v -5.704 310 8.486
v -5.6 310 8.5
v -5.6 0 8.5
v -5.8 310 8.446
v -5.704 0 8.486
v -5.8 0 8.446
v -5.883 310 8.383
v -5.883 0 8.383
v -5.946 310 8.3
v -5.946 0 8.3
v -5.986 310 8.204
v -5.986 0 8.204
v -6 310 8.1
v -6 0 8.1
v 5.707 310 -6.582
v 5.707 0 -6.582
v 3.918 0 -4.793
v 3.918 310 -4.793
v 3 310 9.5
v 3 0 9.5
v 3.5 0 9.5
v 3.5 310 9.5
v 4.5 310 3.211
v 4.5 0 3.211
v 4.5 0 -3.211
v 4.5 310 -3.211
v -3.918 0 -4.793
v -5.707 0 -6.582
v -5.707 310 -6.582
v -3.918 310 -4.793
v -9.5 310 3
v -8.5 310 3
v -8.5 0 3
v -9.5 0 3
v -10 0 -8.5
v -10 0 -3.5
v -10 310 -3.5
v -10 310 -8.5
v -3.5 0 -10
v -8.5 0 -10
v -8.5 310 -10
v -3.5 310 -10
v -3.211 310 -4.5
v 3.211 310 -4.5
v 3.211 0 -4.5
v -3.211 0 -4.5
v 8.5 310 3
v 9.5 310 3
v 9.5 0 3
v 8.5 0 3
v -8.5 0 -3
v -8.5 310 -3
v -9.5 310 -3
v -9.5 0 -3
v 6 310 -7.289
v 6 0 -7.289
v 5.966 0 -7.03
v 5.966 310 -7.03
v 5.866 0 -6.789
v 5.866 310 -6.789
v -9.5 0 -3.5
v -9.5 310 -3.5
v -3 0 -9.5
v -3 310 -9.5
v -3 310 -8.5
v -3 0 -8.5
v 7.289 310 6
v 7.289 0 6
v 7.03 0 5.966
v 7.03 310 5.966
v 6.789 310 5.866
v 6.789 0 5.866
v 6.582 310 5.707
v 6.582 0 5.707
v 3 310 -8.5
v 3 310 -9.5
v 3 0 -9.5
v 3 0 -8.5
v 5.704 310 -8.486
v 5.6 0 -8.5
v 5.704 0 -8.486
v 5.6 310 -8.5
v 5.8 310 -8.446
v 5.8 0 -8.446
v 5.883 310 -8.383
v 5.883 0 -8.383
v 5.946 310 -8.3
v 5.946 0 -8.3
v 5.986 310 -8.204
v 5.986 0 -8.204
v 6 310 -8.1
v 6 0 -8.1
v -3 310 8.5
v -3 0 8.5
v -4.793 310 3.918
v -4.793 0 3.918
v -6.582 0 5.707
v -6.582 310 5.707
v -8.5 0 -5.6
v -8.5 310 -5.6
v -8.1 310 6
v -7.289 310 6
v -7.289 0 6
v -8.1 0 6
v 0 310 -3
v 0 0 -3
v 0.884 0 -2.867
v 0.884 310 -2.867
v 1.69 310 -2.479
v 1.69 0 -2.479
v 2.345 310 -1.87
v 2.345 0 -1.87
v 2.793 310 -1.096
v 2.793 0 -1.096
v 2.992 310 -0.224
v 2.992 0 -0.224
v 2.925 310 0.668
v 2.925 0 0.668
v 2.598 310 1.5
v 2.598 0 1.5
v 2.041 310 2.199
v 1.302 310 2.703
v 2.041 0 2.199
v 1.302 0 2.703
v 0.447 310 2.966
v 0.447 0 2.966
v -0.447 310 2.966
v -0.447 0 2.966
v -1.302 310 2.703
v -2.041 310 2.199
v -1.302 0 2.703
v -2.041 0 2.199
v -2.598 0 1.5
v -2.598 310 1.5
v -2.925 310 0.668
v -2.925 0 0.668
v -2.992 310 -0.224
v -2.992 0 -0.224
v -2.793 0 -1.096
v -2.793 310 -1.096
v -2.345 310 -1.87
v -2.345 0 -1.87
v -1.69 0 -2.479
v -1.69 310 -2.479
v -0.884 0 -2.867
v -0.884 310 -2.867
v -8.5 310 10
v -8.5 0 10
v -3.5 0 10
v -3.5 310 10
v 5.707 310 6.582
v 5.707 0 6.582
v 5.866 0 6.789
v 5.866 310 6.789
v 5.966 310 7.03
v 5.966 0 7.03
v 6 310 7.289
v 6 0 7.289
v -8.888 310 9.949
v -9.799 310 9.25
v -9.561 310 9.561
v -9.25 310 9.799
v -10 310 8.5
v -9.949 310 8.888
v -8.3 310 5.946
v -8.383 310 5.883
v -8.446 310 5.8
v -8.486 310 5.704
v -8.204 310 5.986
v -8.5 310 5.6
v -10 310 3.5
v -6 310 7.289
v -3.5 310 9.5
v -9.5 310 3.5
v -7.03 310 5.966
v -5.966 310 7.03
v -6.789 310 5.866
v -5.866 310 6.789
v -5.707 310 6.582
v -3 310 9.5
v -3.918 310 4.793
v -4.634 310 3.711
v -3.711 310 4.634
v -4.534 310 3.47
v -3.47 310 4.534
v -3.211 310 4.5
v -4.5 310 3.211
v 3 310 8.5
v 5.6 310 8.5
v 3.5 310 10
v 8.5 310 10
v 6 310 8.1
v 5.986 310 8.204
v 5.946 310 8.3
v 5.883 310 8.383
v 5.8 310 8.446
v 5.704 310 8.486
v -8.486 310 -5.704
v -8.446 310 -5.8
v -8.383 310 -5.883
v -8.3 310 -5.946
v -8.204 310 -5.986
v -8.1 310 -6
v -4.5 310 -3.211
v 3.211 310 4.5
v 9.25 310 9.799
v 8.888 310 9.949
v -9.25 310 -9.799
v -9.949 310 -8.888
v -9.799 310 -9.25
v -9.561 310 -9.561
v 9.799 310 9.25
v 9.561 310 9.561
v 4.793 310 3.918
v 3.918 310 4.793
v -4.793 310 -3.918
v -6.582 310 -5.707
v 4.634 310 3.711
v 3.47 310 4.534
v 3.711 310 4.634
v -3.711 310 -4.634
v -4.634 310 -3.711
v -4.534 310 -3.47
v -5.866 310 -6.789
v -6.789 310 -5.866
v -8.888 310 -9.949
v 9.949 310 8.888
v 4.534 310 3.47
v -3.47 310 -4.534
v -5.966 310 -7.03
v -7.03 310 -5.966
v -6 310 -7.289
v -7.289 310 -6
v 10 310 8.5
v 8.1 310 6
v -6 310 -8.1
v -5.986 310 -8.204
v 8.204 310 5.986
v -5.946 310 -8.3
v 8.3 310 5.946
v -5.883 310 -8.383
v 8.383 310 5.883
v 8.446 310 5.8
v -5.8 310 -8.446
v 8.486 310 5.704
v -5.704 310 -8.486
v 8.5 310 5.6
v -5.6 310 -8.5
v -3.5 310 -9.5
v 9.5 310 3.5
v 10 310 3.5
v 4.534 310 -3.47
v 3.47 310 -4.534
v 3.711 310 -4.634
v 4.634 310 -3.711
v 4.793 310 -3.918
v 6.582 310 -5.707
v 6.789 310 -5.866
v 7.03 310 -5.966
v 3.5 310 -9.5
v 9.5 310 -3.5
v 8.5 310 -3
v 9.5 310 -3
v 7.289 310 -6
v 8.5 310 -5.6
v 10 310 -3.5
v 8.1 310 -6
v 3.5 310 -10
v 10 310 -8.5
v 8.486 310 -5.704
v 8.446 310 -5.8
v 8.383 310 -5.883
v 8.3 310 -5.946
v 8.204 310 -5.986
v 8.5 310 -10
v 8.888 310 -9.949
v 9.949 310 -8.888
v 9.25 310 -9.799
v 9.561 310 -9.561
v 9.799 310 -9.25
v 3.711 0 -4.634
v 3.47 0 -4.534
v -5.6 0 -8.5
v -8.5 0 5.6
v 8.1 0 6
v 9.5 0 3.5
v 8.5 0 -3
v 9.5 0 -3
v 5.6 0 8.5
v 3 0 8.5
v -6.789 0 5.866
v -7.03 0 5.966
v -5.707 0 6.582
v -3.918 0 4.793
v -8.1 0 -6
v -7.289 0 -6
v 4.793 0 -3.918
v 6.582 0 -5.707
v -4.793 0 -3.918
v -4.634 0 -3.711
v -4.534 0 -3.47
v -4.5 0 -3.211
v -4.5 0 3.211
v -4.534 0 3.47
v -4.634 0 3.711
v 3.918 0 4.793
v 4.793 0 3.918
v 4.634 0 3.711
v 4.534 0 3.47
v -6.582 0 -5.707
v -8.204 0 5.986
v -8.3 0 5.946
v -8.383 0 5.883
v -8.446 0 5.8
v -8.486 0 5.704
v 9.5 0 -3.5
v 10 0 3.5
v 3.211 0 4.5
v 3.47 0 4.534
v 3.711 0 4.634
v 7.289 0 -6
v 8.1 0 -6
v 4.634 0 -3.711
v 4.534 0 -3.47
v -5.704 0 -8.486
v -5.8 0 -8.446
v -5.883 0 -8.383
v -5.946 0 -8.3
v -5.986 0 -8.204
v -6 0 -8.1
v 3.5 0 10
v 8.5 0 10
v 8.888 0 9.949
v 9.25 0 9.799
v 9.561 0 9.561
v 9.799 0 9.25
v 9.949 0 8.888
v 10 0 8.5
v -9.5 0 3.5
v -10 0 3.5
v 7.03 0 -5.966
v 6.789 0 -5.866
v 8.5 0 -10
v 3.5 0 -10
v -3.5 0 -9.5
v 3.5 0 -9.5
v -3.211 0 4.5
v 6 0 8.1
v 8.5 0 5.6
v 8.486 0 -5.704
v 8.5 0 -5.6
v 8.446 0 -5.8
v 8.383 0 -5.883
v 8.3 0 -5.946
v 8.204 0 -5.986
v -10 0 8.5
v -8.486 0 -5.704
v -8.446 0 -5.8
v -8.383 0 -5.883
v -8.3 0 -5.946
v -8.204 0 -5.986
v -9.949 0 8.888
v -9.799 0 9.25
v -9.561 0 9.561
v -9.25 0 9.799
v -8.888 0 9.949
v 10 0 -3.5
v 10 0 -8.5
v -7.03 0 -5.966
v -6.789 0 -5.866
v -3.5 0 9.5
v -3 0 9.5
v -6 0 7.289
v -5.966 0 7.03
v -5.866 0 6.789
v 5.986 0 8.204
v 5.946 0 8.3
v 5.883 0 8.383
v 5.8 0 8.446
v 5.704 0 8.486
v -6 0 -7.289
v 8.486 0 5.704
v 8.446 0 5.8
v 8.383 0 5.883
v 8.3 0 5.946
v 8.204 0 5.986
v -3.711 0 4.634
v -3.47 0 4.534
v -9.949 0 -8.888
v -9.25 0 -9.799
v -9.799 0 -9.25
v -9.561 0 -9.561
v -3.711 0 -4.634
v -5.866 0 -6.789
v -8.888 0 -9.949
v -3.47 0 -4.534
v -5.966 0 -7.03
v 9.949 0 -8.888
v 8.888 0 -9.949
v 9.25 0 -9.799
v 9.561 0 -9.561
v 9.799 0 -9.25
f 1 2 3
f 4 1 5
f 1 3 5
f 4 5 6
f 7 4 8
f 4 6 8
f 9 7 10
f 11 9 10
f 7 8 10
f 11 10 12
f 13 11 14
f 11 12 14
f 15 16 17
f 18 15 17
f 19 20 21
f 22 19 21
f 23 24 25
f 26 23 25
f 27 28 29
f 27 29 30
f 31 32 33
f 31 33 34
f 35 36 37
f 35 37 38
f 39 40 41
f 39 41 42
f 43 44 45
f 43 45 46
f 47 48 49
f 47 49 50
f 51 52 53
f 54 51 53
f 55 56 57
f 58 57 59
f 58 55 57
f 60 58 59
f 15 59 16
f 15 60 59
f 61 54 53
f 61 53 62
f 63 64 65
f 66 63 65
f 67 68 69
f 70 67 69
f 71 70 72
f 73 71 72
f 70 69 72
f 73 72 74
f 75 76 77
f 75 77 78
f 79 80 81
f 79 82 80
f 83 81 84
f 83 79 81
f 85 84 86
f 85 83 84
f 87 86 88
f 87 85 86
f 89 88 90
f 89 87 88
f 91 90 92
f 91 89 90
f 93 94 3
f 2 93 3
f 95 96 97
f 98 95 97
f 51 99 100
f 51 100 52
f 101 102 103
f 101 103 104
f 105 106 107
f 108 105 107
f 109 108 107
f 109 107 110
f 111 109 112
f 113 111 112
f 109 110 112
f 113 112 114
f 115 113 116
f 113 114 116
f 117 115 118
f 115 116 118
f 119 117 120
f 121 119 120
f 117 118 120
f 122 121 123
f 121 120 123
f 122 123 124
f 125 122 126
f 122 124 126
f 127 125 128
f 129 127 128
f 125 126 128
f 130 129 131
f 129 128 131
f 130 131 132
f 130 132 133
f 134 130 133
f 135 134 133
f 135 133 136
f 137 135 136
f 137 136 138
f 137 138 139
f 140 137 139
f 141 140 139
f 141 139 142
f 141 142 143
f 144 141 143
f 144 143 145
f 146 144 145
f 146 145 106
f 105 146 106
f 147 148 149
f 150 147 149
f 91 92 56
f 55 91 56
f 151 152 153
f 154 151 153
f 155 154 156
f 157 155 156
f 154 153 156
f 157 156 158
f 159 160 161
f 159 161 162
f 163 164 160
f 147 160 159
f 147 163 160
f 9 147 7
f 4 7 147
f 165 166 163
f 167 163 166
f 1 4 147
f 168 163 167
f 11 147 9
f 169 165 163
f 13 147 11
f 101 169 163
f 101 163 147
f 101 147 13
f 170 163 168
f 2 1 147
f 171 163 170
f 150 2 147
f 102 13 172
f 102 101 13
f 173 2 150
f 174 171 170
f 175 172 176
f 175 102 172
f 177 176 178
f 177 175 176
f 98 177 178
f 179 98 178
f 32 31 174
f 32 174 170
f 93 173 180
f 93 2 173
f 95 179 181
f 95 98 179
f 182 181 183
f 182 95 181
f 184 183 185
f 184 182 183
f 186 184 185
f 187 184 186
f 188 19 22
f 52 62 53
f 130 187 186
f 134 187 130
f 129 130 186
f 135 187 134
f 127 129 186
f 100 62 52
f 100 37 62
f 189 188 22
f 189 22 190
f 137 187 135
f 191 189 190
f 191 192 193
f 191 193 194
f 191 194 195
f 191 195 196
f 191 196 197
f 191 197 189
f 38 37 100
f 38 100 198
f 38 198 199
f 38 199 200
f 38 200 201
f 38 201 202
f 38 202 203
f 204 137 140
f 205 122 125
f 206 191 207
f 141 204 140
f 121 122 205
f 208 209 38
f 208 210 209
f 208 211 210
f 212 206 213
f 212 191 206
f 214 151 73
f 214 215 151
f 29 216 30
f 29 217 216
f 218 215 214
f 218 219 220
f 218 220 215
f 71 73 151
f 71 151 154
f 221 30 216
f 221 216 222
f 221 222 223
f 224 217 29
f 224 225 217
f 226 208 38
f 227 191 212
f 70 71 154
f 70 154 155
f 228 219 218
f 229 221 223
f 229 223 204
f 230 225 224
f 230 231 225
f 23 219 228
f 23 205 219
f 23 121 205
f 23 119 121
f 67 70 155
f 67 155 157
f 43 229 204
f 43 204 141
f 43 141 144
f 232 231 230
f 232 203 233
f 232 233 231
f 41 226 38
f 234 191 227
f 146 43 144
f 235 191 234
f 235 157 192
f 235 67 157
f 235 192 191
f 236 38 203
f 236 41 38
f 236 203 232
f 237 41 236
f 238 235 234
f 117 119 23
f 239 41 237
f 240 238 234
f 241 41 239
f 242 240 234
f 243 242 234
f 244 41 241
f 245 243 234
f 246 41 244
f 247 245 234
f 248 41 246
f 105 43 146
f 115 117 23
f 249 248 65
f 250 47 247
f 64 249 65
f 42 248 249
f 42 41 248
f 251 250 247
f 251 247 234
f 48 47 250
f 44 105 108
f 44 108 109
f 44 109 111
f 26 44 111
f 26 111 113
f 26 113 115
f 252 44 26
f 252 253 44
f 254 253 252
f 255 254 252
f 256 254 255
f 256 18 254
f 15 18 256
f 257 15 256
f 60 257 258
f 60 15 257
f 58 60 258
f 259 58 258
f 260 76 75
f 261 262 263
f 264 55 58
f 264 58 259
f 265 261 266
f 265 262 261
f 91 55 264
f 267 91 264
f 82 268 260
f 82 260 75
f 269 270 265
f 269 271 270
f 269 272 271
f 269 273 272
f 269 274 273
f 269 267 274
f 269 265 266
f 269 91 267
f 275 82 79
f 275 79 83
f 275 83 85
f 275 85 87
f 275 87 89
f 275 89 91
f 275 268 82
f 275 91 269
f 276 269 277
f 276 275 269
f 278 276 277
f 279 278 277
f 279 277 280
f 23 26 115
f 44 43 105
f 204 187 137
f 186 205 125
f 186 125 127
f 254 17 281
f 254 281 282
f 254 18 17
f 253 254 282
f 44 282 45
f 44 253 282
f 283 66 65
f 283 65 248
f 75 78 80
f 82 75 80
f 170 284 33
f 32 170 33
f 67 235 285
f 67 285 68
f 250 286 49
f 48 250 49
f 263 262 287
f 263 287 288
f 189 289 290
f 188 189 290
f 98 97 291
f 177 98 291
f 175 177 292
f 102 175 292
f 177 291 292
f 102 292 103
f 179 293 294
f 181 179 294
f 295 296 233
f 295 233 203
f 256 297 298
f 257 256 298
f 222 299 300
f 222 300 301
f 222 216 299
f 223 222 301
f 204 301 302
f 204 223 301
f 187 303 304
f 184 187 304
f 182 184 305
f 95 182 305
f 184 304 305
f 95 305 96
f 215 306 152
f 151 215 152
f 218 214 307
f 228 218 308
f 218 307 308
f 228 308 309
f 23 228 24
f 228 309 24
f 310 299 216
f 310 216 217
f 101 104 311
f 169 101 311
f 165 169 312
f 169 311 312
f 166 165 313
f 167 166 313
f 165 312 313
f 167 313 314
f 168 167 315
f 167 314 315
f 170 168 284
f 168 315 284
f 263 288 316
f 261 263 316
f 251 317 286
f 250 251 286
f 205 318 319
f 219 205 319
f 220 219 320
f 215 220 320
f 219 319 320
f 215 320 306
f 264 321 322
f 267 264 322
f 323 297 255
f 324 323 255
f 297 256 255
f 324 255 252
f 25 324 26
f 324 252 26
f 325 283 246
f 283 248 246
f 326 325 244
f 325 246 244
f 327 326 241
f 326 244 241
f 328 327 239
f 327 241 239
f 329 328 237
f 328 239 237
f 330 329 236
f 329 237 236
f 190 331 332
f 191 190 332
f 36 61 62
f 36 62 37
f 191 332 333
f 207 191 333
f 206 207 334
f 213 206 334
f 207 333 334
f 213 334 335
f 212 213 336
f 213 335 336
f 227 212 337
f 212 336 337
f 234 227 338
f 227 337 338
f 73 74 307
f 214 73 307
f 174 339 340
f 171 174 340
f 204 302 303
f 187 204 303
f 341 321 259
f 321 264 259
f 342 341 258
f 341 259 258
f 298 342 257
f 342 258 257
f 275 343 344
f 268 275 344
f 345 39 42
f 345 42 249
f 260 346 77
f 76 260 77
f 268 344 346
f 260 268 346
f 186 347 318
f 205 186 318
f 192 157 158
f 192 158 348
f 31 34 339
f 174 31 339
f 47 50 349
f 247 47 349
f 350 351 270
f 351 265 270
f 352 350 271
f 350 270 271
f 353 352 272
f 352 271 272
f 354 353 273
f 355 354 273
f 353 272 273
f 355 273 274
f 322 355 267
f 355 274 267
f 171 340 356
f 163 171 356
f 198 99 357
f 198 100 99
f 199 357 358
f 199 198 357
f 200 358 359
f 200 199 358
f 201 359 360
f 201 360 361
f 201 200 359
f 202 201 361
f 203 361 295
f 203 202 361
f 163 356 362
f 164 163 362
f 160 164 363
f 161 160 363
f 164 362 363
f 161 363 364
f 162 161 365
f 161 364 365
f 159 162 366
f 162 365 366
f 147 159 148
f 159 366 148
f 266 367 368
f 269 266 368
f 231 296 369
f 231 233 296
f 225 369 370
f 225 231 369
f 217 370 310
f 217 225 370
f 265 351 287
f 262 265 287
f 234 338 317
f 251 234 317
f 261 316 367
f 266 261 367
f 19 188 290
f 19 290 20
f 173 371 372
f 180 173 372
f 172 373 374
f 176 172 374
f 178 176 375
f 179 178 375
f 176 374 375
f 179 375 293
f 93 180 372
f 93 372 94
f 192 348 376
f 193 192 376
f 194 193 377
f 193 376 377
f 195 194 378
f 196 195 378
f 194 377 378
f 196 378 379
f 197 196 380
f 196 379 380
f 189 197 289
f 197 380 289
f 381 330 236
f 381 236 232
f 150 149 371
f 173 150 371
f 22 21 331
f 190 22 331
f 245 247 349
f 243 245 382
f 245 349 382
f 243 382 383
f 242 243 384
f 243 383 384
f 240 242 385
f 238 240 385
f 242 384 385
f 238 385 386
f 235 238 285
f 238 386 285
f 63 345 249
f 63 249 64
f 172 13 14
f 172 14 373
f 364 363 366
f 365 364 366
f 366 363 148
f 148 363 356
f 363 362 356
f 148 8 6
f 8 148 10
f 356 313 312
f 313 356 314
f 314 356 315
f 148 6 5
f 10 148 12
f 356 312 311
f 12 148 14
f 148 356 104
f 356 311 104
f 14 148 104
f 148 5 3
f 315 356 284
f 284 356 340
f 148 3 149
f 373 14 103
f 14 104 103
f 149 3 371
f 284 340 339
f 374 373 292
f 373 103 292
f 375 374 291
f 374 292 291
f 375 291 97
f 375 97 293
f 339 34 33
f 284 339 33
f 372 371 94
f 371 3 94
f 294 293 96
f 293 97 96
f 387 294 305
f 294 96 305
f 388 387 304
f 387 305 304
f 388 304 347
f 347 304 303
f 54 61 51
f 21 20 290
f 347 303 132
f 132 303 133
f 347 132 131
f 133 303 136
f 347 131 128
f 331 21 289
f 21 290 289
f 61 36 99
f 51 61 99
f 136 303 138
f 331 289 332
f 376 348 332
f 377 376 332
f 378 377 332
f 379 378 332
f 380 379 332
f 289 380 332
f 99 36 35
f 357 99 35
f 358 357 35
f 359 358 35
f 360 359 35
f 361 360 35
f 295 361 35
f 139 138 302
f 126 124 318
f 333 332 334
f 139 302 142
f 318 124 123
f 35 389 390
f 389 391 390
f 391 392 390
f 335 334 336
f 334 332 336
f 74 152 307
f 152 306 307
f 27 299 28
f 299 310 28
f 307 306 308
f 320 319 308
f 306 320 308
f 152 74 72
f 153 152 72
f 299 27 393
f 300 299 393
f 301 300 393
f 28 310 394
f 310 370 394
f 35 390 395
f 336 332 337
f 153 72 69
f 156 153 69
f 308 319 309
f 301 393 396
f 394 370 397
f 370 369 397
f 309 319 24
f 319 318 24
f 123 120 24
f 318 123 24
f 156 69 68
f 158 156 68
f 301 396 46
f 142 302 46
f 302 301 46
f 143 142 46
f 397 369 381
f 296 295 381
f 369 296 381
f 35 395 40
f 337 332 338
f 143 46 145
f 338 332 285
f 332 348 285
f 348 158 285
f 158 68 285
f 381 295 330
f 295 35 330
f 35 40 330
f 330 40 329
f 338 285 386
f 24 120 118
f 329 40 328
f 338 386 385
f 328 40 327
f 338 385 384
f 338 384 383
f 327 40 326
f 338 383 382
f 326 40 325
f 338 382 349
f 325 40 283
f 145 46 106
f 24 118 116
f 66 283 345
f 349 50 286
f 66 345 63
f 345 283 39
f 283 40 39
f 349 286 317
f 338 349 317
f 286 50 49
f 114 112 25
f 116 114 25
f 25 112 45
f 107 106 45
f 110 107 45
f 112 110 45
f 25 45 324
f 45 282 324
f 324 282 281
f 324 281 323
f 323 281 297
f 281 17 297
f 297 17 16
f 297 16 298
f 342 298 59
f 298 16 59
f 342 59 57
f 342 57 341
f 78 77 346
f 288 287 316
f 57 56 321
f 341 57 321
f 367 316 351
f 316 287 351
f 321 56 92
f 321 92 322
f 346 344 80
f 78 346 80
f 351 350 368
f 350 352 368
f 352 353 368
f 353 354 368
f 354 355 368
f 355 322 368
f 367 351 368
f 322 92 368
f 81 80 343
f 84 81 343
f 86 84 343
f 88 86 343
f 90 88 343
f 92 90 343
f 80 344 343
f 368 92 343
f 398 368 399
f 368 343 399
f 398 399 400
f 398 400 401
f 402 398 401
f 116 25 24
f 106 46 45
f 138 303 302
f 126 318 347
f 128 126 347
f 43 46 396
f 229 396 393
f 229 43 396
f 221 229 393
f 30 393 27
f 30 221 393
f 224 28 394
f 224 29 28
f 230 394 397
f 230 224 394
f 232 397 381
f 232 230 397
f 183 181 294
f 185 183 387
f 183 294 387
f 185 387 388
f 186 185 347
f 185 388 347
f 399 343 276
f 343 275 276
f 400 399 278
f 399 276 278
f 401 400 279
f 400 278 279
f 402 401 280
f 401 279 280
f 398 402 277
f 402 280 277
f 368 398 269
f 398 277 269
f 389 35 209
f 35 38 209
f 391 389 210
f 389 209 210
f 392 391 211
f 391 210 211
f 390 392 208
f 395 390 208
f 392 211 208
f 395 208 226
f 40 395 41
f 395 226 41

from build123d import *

# Parameters (mm, degrees)
BOSS_EXTRU_1_CORPS_DEPTH    = 310
CONG_1_R                    = 1.5
CONG_2_R                    = 0.4
CONG_4_R                    = 1
CONG_1_OF_SYM_TRIE_BRAS_R   = 1.5
CONG_2_OF_SYM_TRIE_BRAS_R   = 0.4
CONG_4_OF_SYM_TRIE_BRAS_R   = 1
SYM_TRIE_BRAS_DOUBLE_DEPTH  = 310
APR_S_TARODAGE_M6_R         = 3
ENL_V_MAT_FILETAGE_M6_DEPTH = 311.322412984


# Read off the part's stored shape, not the designer's step: Symétrie Bras double
with BuildPart() as part:
    # Esquisse4 → Boss.-Extru.1 Corps (new body)
    with BuildSketch(Plane(origin=(0, 0, 0), x_dir=(1, 0, 0), z_dir=(0, 1, 0))):
        Polygon((0, 0), (-4.5, 0), (-4.5, 3.625), (-6.875, 6), (-8.5, 6), (-8.5, 3), (-9.5, 3), (-9.5, 3.5), (-10, 3.5), (-10, 10), (-3.5, 10), (-3.5, 9.5), (-3, 9.5), (-3, 8.5), (-6, 8.5), (-6, 6.875), (-3.625, 4.5), (0, 4.5), align=None)
    boss_extru_1_corps = extrude(amount=BOSS_EXTRU_1_CORPS_DEPTH)

    # Congé1
    cong_1_edges = [part.edges().sort_by_distance(p)[0] for p in [
        (-10, 155, -10),
    ]]
    fillet(cong_1_edges, radius=CONG_1_R)

    # Congé2
    cong_2_edges = [part.edges().sort_by_distance(p)[0] for p in [
        (-8.5, 155, -6),
        (-6, 155, -8.5),
    ]]
    fillet(cong_2_edges, radius=CONG_2_R)

    # Congé4
    cong_4_edges = [part.edges().sort_by_distance(p)[0] for p in [
        (-4.5, 155, -3.625),
        (-6.875, 155, -6),
        (-6, 155, -6.875),
        (-3.625, 155, -4.5),
    ]]
    fillet(cong_4_edges, radius=CONG_4_R)

    # Symétrie Bras: Boss.-Extru.1 Corps across plane
    add(boss_extru_1_corps.mirror(Plane(origin=(0, 310, -4.5), x_dir=(0, 0, 1), z_dir=(-1, 0, 0))))

    # Congé1 of Symétrie Bras
    cong_1_of_sym_trie_bras_edges = [part.edges().sort_by_distance(p)[0] for p in [
        (10, 155, -10),
    ]]
    fillet(cong_1_of_sym_trie_bras_edges, radius=CONG_1_OF_SYM_TRIE_BRAS_R)

    # Congé2 of Symétrie Bras
    cong_2_of_sym_trie_bras_edges = [part.edges().sort_by_distance(p)[0] for p in [
        (8.5, 155, -6),
        (6, 155, -8.5),
    ]]
    fillet(cong_2_of_sym_trie_bras_edges, radius=CONG_2_OF_SYM_TRIE_BRAS_R)

    # Congé4 of Symétrie Bras
    cong_4_of_sym_trie_bras_edges = [part.edges().sort_by_distance(p)[0] for p in [
        (4.5, 155, -3.625),
        (6.875, 155, -6),
        (6, 155, -6.875),
        (3.625, 155, -4.5),
    ]]
    fillet(cong_4_of_sym_trie_bras_edges, radius=CONG_4_OF_SYM_TRIE_BRAS_R)

    # Symétrie Bras double outline → Symétrie Bras double (add)
    with BuildSketch(Plane(origin=(0, 0, 0), x_dir=(1, 0, 0), z_dir=(0, 1, 0))):
        with BuildLine():
            ThreePointArc((7.289213562, -6), (6.90653013, -5.923879533), (6.582106781, -5.707106781))
            Line((6.582106781, -5.707106781), (4.792893219, -3.917893219))
            ThreePointArc((4.792893219, -3.917893219), (4.576120467, -3.59346987), (4.5, -3.210786438))
            Line((4.5, -3.210786438), (4.5, 0))
            Line((4.5, 0), (-4.5, 0))
            Line((-4.5, 0), (-4.5, -3.210786438))
            ThreePointArc((-4.5, -3.210786438), (-4.576120467, -3.59346987), (-4.792893219, -3.917893219))
            Line((-4.792893219, -3.917893219), (-6.582106781, -5.707106781))
            ThreePointArc((-6.582106781, -5.707106781), (-6.90653013, -5.923879533), (-7.289213562, -6))
            Line((-7.289213562, -6), (-8.1, -6))
            ThreePointArc((-8.1, -6), (-8.382842712, -5.882842712), (-8.5, -5.6))
            Line((-8.5, -5.6), (-8.5, -3))
            Line((-8.5, -3), (-9.5, -3))
            Line((-9.5, -3), (-9.5, -3.5))
            Line((-9.5, -3.5), (-10, -3.5))
            Line((-10, -3.5), (-10, -8.5))
            ThreePointArc((-10, -8.5), (-9.560660172, -9.560660172), (-8.5, -10))
            Line((-8.5, -10), (-3.5, -10))
            Line((-3.5, -10), (-3.5, -9.5))
            Line((-3.5, -9.5), (-3, -9.5))
            Line((-3, -9.5), (-3, -8.5))
            Line((-3, -8.5), (-5.6, -8.5))
            ThreePointArc((-5.6, -8.5), (-5.882842712, -8.382842712), (-6, -8.1))
            Line((-6, -8.1), (-6, -7.289213562))
            ThreePointArc((-6, -7.289213562), (-5.923879533, -6.90653013), (-5.707106781, -6.582106781))
            Line((-5.707106781, -6.582106781), (-3.917893219, -4.792893219))
            ThreePointArc((-3.917893219, -4.792893219), (-3.59346987, -4.576120467), (-3.210786438, -4.5))
            Line((-3.210786438, -4.5), (3.210786438, -4.5))
            ThreePointArc((3.210786438, -4.5), (3.59346987, -4.576120467), (3.917893219, -4.792893219))
            Line((3.917893219, -4.792893219), (5.707106781, -6.582106781))
            ThreePointArc((5.707106781, -6.582106781), (5.923879533, -6.90653013), (6, -7.289213562))
            Line((6, -7.289213562), (6, -8.1))
            ThreePointArc((6, -8.1), (5.882842712, -8.382842712), (5.6, -8.5))
            Line((5.6, -8.5), (3, -8.5))
            Line((3, -8.5), (3, -9.5))
            Line((3, -9.5), (3.5, -9.5))
            Line((3.5, -9.5), (3.5, -10))
            Line((3.5, -10), (8.5, -10))
            ThreePointArc((8.5, -10), (9.560660172, -9.560660172), (10, -8.5))
            Line((10, -8.5), (10, -3.5))
            Line((10, -3.5), (9.5, -3.5))
            Line((9.5, -3.5), (9.5, -3))
            Line((9.5, -3), (8.5, -3))
            Line((8.5, -3), (8.5, -5.6))
            ThreePointArc((8.5, -5.6), (8.382842712, -5.882842712), (8.1, -6))
            Line((8.1, -6), (7.289213562, -6))
        make_face()
    extrude(amount=SYM_TRIE_BRAS_DOUBLE_DEPTH)

    # Après tarodage M6 → Enlèv. mat.-Filetage M6 (cut, through all)
    with BuildSketch(Plane.XZ):
        with Locations(Location((0, 0, 0), (0, 0, 270))):
            Circle(APR_S_TARODAGE_M6_R)
    extrude(amount=-ENL_V_MAT_FILETAGE_M6_DEPTH, mode=Mode.SUBTRACT)


solid = part.part
